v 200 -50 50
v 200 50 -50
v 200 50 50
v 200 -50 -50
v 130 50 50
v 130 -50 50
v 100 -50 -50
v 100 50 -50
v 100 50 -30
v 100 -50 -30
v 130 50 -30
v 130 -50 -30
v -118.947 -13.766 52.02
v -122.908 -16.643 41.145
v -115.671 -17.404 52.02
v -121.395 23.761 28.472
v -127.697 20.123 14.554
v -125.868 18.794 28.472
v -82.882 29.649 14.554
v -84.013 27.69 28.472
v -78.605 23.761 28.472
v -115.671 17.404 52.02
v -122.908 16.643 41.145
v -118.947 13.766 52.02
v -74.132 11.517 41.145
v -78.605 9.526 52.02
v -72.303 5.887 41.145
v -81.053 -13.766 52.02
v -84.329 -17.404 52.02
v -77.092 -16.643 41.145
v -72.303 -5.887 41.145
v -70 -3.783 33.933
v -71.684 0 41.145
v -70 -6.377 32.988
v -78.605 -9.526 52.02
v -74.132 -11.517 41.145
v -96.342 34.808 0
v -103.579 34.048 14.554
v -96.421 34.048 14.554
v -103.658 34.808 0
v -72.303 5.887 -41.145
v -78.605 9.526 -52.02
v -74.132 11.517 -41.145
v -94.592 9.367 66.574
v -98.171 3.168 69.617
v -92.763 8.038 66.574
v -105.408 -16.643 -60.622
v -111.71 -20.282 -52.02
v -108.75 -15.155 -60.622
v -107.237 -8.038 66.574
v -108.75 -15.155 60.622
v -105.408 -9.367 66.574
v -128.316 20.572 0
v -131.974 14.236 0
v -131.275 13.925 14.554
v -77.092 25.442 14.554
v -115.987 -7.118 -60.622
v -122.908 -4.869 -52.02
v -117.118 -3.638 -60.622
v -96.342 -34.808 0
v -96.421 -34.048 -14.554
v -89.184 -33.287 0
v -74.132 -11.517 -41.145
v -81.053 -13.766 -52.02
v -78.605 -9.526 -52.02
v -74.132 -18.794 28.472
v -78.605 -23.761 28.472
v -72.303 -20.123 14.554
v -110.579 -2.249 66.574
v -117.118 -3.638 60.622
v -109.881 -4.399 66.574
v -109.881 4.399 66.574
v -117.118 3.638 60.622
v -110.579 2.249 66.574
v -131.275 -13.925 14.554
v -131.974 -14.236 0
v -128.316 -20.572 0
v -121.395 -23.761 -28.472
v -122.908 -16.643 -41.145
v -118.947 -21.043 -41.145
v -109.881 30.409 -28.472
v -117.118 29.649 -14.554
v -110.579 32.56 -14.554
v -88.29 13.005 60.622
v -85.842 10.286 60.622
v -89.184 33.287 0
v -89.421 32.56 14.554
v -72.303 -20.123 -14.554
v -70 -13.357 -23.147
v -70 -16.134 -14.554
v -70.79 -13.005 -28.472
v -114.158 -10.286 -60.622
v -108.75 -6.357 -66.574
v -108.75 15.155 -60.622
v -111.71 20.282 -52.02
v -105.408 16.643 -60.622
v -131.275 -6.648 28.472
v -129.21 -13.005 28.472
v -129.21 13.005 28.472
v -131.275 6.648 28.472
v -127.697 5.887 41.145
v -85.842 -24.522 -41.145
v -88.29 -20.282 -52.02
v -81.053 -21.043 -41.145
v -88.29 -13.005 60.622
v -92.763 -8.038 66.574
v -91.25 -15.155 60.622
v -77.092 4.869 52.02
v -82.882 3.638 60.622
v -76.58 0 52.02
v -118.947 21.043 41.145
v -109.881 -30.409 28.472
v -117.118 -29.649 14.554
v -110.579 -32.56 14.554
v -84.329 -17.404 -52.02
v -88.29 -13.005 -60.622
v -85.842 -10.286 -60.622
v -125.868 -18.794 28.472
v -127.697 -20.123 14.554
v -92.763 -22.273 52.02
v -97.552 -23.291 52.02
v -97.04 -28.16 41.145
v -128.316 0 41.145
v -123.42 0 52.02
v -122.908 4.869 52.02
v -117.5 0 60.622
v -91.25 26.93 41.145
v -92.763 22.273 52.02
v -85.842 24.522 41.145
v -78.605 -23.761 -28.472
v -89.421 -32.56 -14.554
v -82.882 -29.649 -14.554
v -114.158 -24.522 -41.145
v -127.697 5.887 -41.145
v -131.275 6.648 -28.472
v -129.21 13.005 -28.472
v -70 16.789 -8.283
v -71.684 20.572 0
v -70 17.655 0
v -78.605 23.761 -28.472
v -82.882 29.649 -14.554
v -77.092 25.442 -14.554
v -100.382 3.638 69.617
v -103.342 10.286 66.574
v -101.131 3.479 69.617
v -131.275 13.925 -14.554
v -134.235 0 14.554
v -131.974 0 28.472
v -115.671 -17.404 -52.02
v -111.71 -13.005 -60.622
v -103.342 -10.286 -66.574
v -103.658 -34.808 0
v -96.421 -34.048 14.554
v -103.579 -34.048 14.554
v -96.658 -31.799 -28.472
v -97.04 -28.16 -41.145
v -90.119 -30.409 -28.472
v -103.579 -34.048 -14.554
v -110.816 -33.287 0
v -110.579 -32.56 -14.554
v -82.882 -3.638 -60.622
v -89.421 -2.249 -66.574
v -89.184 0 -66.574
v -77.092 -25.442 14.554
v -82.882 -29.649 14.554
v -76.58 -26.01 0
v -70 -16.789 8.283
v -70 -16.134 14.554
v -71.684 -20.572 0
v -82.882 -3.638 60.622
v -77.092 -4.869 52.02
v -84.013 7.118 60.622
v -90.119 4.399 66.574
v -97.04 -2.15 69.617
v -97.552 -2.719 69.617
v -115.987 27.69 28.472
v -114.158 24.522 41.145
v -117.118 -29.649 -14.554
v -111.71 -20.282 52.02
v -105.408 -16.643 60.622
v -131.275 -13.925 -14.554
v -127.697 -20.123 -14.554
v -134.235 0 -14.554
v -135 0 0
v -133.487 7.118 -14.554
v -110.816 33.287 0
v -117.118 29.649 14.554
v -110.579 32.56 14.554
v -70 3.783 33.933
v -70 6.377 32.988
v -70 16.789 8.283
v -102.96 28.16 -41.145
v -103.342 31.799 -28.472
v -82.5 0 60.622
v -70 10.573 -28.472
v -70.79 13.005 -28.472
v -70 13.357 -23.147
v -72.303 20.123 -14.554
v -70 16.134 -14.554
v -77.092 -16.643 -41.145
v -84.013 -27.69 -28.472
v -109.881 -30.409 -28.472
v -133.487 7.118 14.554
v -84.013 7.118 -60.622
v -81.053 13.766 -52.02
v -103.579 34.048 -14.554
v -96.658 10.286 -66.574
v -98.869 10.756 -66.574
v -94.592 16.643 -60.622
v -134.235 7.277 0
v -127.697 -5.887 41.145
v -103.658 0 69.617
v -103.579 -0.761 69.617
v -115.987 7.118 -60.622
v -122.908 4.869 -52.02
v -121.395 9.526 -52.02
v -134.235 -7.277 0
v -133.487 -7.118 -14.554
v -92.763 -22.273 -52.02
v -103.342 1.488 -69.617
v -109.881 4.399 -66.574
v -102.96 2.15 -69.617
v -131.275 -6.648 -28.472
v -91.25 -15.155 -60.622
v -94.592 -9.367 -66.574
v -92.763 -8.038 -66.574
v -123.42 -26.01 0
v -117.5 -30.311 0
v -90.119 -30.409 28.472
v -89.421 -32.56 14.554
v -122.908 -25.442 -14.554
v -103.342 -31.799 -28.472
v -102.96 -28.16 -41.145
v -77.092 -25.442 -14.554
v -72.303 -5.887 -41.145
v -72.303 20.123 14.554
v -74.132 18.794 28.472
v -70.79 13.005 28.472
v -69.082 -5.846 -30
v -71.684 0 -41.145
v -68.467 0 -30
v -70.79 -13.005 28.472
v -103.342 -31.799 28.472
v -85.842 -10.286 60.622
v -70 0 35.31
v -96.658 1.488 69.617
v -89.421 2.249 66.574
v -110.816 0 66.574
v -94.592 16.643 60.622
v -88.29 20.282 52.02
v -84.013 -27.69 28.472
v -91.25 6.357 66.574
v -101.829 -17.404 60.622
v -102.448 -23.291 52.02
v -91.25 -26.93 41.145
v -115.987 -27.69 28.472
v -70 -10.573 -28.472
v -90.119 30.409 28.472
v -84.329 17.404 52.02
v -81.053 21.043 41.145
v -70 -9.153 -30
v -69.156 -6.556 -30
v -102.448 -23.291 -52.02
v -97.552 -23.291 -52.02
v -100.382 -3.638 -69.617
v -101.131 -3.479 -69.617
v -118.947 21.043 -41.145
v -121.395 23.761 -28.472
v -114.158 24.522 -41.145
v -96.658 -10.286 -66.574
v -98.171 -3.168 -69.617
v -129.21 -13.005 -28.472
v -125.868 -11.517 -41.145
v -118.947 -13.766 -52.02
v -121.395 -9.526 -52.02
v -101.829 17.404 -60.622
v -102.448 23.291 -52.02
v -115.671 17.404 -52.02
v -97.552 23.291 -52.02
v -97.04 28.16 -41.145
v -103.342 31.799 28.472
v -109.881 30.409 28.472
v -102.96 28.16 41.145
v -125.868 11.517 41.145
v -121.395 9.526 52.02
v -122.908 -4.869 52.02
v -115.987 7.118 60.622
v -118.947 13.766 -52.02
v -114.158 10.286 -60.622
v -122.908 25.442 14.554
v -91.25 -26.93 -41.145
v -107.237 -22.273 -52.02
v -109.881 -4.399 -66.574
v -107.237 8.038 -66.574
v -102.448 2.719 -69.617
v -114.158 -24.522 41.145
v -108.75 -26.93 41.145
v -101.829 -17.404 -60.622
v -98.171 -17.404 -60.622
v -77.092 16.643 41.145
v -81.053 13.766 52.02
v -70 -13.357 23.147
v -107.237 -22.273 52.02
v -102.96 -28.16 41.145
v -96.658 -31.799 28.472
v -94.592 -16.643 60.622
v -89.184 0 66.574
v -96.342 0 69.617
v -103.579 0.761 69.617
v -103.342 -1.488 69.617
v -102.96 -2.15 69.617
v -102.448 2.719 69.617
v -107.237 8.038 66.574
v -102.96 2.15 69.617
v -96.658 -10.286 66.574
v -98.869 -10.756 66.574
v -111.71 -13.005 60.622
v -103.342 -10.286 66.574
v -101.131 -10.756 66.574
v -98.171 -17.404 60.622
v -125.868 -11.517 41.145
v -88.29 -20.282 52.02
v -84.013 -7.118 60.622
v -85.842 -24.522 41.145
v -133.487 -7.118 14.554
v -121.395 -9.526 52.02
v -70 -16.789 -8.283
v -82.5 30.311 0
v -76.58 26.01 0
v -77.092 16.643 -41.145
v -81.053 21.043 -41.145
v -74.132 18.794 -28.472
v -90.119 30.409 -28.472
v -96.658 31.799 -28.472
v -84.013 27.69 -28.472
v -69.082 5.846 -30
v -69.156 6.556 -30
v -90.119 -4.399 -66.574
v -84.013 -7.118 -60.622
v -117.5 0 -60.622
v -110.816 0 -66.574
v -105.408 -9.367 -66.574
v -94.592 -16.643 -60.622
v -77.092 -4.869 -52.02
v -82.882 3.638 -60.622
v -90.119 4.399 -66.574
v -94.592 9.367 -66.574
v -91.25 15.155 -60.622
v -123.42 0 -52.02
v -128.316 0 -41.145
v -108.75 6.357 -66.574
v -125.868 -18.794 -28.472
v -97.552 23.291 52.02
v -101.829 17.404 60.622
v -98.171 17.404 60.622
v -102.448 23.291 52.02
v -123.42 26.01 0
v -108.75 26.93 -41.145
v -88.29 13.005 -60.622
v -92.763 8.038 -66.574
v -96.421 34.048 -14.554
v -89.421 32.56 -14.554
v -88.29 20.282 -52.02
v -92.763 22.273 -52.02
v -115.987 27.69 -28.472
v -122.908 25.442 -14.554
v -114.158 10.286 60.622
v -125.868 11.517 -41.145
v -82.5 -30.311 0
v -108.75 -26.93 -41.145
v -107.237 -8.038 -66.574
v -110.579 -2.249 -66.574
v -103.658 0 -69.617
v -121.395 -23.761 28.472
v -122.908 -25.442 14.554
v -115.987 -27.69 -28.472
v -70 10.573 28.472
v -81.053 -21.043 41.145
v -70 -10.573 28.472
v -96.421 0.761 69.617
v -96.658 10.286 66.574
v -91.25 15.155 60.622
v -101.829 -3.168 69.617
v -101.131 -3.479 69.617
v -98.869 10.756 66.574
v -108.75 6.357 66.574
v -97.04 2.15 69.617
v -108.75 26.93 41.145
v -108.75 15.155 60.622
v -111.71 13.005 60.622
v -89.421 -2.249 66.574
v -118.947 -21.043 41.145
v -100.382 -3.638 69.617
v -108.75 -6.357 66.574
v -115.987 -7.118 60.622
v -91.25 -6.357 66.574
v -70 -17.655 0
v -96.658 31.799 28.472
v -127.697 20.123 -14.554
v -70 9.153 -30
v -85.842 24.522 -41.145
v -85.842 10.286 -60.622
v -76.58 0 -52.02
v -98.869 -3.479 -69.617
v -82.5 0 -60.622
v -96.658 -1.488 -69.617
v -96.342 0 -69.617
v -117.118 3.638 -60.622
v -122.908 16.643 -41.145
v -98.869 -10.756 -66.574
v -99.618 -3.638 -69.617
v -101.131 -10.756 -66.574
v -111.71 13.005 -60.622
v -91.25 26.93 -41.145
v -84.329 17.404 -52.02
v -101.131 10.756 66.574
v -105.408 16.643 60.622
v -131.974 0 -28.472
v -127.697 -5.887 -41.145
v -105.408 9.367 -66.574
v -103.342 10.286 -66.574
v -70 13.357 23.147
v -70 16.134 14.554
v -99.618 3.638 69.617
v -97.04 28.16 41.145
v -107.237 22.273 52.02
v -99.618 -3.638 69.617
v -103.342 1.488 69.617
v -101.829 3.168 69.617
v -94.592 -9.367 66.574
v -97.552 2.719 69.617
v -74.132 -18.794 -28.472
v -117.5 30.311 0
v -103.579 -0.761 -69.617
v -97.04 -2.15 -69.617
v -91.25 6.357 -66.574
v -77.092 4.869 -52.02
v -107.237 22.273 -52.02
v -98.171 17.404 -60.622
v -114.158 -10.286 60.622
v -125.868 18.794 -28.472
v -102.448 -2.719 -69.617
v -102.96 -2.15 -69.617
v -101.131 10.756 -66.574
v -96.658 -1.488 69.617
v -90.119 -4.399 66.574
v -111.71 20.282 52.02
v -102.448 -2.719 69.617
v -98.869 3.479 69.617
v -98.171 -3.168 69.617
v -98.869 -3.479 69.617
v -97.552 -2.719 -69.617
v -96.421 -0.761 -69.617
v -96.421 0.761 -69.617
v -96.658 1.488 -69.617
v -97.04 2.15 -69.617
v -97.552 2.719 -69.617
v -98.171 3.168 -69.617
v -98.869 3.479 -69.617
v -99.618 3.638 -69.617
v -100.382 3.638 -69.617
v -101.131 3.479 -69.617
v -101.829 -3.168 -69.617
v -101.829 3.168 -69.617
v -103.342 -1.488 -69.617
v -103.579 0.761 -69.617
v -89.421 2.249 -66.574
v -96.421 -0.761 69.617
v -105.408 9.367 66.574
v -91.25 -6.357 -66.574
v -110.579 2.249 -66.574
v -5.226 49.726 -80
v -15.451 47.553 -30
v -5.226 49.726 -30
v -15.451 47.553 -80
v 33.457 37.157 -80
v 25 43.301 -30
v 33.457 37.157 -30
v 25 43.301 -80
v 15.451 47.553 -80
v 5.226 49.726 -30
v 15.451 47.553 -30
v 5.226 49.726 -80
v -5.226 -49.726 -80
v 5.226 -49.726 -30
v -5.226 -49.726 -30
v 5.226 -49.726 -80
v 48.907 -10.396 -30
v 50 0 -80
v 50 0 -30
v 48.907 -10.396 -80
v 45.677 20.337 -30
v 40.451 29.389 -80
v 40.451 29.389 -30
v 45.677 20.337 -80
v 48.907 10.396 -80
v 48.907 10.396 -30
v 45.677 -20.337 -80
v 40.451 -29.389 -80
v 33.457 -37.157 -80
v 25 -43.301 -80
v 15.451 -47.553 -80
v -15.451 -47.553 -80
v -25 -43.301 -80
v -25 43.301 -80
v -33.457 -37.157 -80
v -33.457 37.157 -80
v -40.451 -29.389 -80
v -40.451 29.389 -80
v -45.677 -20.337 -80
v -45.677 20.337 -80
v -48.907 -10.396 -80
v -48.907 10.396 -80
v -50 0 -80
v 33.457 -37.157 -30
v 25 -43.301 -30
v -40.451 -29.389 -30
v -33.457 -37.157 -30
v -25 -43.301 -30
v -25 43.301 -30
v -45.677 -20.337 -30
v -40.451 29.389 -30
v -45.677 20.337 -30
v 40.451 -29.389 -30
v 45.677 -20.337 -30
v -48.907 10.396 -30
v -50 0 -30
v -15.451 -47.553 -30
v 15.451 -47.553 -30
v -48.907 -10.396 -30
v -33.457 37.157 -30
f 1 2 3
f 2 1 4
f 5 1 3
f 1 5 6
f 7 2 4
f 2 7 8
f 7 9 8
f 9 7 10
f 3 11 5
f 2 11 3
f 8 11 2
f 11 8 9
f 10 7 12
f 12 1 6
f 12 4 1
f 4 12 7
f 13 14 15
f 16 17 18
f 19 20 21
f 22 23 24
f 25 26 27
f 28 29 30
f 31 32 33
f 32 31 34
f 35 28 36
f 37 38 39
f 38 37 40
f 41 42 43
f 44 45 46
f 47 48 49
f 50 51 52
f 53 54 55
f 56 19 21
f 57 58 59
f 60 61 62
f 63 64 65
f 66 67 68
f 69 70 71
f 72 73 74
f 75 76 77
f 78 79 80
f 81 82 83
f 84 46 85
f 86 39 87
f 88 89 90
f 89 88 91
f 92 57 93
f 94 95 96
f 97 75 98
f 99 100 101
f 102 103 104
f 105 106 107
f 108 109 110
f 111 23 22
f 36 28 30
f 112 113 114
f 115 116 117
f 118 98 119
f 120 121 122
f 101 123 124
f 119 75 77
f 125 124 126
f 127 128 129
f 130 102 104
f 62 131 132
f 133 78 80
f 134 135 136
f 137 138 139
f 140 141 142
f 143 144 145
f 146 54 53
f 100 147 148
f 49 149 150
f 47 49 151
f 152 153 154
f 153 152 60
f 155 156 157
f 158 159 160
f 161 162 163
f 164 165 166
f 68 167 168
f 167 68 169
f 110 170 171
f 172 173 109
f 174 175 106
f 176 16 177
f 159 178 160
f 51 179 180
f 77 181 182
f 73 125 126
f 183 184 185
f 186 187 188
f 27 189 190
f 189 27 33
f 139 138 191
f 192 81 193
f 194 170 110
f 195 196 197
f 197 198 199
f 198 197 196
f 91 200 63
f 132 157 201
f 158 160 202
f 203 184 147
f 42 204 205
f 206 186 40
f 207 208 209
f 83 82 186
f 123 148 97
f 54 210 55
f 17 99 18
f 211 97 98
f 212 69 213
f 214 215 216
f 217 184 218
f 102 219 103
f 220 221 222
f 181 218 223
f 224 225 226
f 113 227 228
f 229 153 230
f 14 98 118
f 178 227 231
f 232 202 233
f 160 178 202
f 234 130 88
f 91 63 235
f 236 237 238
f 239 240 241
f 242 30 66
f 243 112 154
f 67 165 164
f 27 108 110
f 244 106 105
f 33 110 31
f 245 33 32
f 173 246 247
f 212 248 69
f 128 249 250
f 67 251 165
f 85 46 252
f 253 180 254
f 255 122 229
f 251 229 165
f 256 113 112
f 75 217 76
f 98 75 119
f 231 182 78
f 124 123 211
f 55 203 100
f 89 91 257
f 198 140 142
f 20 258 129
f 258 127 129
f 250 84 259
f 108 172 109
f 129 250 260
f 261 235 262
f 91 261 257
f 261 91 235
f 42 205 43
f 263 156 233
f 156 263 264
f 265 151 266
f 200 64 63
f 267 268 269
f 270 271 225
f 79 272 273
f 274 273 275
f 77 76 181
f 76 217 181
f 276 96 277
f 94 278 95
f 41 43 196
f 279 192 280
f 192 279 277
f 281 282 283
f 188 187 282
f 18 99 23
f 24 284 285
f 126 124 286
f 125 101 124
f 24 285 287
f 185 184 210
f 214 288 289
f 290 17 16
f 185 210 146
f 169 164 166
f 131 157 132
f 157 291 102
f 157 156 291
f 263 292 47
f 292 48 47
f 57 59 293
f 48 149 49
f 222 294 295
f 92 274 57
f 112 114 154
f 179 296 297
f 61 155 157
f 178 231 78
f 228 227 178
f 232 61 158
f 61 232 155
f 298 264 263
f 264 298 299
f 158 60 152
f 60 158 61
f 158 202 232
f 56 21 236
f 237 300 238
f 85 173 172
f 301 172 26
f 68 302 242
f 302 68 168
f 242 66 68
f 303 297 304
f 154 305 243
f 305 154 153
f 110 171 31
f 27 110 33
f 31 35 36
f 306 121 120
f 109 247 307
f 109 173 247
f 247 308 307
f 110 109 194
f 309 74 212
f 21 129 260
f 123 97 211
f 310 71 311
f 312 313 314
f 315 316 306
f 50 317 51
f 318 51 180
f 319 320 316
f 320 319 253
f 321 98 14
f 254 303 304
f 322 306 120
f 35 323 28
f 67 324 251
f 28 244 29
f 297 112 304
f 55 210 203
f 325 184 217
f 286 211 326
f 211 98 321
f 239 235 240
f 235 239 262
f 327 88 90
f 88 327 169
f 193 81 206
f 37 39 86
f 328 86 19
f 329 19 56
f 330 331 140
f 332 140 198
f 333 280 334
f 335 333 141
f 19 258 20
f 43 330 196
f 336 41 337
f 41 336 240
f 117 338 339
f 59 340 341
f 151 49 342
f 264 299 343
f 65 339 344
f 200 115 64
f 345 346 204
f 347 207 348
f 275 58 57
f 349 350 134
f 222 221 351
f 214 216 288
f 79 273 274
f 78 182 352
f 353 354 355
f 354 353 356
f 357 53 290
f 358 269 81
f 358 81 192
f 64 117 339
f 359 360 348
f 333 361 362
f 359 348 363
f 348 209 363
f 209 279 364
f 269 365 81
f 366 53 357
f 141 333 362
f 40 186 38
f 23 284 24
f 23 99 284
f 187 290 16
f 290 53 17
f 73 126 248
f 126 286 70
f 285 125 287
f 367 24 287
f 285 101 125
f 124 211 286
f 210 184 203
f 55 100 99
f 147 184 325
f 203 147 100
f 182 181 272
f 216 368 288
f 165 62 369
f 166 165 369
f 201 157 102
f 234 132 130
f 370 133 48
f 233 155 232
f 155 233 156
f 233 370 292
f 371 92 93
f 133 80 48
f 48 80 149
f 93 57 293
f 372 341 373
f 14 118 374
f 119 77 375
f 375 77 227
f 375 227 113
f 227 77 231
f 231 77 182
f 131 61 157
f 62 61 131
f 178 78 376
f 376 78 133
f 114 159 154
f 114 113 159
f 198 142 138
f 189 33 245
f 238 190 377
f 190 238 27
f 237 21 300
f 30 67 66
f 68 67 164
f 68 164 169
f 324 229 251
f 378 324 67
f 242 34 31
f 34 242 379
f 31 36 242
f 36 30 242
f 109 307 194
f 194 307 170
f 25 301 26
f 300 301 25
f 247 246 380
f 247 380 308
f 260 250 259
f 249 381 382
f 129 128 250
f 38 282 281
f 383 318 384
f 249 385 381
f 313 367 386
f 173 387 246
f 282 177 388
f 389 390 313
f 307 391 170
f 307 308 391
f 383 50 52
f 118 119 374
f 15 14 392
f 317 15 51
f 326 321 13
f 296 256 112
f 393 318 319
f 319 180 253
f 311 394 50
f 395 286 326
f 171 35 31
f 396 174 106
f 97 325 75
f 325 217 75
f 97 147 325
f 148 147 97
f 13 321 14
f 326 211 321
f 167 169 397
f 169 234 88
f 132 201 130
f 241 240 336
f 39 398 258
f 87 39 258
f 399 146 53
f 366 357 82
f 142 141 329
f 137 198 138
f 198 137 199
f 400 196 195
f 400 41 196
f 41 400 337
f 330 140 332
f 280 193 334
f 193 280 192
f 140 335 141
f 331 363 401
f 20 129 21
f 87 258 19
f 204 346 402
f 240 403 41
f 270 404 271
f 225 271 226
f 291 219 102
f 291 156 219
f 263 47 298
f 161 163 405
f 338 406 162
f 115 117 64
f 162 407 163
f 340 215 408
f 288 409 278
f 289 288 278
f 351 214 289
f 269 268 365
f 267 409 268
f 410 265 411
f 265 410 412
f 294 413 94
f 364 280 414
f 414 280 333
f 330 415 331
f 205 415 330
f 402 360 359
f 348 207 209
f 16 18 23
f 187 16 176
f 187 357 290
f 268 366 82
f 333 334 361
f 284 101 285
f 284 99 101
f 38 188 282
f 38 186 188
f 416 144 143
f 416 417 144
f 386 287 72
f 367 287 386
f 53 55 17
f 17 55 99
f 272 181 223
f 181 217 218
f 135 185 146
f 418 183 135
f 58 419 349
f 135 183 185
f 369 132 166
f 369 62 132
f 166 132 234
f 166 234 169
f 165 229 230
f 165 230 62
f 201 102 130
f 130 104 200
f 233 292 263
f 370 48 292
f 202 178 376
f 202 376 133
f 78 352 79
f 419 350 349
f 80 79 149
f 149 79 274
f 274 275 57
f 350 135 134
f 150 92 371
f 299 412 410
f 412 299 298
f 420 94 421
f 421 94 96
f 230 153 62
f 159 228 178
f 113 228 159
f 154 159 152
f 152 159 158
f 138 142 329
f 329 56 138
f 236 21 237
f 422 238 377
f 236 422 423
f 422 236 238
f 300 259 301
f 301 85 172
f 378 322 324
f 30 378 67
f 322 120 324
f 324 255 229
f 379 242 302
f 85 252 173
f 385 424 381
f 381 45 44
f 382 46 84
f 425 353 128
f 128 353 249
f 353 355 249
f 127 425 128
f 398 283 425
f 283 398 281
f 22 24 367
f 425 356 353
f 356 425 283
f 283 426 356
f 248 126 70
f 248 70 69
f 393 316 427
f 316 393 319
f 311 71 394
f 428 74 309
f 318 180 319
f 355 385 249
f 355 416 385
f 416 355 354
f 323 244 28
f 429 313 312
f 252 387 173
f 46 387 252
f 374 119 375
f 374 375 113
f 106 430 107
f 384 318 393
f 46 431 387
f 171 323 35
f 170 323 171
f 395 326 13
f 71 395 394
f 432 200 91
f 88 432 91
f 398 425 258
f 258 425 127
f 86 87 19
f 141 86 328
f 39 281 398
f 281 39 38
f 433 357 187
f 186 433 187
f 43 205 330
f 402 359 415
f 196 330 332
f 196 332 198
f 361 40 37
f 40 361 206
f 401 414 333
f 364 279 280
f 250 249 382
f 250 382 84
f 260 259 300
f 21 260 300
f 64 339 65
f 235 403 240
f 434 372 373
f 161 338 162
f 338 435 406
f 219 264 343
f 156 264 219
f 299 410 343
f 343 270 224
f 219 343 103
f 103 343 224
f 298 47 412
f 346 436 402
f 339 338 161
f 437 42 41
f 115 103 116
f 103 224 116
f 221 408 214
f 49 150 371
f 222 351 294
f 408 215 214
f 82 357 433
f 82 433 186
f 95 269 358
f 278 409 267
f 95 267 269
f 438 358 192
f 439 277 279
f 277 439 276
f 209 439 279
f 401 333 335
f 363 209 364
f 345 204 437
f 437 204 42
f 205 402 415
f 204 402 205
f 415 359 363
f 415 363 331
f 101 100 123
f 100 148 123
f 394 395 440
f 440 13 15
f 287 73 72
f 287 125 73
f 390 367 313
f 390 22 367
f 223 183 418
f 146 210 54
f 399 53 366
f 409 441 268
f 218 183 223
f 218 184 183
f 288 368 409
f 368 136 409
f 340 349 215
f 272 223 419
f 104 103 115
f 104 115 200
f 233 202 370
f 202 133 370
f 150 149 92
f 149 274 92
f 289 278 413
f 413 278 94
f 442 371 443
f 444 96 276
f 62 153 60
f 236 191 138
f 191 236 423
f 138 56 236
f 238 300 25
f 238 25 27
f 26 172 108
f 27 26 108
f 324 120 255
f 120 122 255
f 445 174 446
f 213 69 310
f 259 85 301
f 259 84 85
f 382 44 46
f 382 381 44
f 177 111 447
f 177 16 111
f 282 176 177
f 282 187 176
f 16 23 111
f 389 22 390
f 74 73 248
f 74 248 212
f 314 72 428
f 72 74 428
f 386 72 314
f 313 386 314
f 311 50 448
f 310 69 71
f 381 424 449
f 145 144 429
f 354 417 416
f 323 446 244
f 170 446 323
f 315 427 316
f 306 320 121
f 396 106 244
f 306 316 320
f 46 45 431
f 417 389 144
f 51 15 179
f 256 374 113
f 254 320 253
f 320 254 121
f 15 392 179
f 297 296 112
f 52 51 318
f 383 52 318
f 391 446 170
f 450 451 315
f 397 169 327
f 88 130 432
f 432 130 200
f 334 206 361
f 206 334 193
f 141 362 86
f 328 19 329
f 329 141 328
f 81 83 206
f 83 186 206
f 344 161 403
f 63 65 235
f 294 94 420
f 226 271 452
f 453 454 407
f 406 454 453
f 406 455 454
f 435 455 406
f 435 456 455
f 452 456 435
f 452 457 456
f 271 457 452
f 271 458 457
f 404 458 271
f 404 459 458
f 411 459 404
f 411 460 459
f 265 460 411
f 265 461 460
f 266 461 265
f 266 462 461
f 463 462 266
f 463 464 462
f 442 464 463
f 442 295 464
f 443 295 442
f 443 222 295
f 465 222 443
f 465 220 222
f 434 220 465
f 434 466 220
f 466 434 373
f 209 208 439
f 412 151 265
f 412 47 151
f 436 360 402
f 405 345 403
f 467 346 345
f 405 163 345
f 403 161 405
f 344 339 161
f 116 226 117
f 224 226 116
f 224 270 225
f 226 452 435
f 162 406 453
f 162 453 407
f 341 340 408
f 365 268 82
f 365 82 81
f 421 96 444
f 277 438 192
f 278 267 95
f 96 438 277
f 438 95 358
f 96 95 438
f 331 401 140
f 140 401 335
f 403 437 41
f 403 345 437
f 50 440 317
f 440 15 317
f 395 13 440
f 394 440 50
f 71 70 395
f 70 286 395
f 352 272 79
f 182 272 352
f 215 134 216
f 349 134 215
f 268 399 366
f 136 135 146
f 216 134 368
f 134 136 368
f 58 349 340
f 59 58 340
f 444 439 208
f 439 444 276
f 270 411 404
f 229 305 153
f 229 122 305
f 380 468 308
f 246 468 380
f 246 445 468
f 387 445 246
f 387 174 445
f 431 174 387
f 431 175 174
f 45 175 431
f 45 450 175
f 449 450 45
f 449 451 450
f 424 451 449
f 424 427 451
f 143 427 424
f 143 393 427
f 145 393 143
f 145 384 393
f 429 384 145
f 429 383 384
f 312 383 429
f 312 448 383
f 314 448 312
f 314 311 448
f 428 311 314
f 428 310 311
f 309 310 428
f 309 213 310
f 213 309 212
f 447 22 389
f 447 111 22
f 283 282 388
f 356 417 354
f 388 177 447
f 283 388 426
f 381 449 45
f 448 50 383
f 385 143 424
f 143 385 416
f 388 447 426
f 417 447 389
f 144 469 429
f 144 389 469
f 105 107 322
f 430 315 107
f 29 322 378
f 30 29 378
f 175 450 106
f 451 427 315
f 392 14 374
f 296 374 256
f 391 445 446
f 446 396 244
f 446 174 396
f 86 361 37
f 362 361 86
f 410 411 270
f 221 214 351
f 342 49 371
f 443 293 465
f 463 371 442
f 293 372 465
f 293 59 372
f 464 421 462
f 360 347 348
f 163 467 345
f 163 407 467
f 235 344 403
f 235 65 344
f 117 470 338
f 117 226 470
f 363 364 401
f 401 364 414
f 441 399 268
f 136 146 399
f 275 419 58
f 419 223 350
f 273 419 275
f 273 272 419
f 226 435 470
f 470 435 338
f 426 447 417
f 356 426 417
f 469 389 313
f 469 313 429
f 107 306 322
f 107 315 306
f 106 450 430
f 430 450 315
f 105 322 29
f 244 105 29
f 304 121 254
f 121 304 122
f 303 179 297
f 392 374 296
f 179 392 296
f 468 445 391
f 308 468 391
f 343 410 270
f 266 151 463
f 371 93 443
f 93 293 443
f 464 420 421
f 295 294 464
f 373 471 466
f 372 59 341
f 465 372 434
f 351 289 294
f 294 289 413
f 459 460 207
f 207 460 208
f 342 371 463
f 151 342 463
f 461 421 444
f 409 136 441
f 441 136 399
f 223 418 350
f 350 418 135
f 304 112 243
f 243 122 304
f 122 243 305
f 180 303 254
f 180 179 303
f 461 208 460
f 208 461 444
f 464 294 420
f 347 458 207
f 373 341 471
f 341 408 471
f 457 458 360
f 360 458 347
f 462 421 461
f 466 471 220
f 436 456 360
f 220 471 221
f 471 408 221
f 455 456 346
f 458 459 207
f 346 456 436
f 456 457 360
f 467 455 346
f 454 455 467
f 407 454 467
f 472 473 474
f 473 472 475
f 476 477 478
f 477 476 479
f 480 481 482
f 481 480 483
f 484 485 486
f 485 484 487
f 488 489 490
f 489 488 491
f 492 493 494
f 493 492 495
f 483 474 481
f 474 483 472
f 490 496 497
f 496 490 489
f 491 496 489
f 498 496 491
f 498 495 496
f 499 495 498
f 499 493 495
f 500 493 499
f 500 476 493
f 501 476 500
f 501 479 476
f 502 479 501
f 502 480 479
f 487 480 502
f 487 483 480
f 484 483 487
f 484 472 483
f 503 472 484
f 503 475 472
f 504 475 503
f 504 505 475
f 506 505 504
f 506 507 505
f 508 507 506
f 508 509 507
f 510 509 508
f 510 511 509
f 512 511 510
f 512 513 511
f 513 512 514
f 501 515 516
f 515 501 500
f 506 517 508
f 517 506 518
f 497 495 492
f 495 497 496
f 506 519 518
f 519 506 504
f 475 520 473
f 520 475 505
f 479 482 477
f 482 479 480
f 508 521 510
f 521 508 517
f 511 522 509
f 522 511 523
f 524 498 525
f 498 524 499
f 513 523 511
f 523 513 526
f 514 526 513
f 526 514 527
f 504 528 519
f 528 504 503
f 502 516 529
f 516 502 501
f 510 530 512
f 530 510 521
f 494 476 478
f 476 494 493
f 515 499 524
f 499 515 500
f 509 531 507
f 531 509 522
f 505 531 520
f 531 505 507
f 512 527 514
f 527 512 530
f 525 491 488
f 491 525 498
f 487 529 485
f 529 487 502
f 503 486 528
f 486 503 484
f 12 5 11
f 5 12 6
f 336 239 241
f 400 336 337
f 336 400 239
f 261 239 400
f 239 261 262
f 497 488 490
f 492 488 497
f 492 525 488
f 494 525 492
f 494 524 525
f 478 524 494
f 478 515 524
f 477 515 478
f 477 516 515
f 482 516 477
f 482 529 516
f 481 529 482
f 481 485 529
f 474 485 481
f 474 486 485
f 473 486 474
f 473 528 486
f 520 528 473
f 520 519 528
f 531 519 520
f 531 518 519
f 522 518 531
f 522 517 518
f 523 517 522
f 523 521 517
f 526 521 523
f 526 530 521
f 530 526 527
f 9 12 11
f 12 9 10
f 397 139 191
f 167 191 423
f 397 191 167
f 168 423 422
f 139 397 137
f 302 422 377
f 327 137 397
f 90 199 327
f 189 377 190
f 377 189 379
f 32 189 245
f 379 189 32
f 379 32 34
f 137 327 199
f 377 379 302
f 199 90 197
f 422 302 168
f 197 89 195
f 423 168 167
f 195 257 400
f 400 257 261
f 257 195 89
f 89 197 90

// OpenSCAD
difference () {
  union () {
    translate ([150, 0, 0]) {
      rotate ([0.0,0.0,0.0]) {
        cube ([100, 100, 100], center=true);
      }
    }
    translate ([-100, 0, 0]) {
      scale ([1/2, 1/2, 1]) {
        sphere (r=70);
      }
    }
    cylinder (h=160, r=50, center=true);
  }
  translate ([30, 0, 70]) {
    cube ([200, 200, 200], center=true);
  }
}
